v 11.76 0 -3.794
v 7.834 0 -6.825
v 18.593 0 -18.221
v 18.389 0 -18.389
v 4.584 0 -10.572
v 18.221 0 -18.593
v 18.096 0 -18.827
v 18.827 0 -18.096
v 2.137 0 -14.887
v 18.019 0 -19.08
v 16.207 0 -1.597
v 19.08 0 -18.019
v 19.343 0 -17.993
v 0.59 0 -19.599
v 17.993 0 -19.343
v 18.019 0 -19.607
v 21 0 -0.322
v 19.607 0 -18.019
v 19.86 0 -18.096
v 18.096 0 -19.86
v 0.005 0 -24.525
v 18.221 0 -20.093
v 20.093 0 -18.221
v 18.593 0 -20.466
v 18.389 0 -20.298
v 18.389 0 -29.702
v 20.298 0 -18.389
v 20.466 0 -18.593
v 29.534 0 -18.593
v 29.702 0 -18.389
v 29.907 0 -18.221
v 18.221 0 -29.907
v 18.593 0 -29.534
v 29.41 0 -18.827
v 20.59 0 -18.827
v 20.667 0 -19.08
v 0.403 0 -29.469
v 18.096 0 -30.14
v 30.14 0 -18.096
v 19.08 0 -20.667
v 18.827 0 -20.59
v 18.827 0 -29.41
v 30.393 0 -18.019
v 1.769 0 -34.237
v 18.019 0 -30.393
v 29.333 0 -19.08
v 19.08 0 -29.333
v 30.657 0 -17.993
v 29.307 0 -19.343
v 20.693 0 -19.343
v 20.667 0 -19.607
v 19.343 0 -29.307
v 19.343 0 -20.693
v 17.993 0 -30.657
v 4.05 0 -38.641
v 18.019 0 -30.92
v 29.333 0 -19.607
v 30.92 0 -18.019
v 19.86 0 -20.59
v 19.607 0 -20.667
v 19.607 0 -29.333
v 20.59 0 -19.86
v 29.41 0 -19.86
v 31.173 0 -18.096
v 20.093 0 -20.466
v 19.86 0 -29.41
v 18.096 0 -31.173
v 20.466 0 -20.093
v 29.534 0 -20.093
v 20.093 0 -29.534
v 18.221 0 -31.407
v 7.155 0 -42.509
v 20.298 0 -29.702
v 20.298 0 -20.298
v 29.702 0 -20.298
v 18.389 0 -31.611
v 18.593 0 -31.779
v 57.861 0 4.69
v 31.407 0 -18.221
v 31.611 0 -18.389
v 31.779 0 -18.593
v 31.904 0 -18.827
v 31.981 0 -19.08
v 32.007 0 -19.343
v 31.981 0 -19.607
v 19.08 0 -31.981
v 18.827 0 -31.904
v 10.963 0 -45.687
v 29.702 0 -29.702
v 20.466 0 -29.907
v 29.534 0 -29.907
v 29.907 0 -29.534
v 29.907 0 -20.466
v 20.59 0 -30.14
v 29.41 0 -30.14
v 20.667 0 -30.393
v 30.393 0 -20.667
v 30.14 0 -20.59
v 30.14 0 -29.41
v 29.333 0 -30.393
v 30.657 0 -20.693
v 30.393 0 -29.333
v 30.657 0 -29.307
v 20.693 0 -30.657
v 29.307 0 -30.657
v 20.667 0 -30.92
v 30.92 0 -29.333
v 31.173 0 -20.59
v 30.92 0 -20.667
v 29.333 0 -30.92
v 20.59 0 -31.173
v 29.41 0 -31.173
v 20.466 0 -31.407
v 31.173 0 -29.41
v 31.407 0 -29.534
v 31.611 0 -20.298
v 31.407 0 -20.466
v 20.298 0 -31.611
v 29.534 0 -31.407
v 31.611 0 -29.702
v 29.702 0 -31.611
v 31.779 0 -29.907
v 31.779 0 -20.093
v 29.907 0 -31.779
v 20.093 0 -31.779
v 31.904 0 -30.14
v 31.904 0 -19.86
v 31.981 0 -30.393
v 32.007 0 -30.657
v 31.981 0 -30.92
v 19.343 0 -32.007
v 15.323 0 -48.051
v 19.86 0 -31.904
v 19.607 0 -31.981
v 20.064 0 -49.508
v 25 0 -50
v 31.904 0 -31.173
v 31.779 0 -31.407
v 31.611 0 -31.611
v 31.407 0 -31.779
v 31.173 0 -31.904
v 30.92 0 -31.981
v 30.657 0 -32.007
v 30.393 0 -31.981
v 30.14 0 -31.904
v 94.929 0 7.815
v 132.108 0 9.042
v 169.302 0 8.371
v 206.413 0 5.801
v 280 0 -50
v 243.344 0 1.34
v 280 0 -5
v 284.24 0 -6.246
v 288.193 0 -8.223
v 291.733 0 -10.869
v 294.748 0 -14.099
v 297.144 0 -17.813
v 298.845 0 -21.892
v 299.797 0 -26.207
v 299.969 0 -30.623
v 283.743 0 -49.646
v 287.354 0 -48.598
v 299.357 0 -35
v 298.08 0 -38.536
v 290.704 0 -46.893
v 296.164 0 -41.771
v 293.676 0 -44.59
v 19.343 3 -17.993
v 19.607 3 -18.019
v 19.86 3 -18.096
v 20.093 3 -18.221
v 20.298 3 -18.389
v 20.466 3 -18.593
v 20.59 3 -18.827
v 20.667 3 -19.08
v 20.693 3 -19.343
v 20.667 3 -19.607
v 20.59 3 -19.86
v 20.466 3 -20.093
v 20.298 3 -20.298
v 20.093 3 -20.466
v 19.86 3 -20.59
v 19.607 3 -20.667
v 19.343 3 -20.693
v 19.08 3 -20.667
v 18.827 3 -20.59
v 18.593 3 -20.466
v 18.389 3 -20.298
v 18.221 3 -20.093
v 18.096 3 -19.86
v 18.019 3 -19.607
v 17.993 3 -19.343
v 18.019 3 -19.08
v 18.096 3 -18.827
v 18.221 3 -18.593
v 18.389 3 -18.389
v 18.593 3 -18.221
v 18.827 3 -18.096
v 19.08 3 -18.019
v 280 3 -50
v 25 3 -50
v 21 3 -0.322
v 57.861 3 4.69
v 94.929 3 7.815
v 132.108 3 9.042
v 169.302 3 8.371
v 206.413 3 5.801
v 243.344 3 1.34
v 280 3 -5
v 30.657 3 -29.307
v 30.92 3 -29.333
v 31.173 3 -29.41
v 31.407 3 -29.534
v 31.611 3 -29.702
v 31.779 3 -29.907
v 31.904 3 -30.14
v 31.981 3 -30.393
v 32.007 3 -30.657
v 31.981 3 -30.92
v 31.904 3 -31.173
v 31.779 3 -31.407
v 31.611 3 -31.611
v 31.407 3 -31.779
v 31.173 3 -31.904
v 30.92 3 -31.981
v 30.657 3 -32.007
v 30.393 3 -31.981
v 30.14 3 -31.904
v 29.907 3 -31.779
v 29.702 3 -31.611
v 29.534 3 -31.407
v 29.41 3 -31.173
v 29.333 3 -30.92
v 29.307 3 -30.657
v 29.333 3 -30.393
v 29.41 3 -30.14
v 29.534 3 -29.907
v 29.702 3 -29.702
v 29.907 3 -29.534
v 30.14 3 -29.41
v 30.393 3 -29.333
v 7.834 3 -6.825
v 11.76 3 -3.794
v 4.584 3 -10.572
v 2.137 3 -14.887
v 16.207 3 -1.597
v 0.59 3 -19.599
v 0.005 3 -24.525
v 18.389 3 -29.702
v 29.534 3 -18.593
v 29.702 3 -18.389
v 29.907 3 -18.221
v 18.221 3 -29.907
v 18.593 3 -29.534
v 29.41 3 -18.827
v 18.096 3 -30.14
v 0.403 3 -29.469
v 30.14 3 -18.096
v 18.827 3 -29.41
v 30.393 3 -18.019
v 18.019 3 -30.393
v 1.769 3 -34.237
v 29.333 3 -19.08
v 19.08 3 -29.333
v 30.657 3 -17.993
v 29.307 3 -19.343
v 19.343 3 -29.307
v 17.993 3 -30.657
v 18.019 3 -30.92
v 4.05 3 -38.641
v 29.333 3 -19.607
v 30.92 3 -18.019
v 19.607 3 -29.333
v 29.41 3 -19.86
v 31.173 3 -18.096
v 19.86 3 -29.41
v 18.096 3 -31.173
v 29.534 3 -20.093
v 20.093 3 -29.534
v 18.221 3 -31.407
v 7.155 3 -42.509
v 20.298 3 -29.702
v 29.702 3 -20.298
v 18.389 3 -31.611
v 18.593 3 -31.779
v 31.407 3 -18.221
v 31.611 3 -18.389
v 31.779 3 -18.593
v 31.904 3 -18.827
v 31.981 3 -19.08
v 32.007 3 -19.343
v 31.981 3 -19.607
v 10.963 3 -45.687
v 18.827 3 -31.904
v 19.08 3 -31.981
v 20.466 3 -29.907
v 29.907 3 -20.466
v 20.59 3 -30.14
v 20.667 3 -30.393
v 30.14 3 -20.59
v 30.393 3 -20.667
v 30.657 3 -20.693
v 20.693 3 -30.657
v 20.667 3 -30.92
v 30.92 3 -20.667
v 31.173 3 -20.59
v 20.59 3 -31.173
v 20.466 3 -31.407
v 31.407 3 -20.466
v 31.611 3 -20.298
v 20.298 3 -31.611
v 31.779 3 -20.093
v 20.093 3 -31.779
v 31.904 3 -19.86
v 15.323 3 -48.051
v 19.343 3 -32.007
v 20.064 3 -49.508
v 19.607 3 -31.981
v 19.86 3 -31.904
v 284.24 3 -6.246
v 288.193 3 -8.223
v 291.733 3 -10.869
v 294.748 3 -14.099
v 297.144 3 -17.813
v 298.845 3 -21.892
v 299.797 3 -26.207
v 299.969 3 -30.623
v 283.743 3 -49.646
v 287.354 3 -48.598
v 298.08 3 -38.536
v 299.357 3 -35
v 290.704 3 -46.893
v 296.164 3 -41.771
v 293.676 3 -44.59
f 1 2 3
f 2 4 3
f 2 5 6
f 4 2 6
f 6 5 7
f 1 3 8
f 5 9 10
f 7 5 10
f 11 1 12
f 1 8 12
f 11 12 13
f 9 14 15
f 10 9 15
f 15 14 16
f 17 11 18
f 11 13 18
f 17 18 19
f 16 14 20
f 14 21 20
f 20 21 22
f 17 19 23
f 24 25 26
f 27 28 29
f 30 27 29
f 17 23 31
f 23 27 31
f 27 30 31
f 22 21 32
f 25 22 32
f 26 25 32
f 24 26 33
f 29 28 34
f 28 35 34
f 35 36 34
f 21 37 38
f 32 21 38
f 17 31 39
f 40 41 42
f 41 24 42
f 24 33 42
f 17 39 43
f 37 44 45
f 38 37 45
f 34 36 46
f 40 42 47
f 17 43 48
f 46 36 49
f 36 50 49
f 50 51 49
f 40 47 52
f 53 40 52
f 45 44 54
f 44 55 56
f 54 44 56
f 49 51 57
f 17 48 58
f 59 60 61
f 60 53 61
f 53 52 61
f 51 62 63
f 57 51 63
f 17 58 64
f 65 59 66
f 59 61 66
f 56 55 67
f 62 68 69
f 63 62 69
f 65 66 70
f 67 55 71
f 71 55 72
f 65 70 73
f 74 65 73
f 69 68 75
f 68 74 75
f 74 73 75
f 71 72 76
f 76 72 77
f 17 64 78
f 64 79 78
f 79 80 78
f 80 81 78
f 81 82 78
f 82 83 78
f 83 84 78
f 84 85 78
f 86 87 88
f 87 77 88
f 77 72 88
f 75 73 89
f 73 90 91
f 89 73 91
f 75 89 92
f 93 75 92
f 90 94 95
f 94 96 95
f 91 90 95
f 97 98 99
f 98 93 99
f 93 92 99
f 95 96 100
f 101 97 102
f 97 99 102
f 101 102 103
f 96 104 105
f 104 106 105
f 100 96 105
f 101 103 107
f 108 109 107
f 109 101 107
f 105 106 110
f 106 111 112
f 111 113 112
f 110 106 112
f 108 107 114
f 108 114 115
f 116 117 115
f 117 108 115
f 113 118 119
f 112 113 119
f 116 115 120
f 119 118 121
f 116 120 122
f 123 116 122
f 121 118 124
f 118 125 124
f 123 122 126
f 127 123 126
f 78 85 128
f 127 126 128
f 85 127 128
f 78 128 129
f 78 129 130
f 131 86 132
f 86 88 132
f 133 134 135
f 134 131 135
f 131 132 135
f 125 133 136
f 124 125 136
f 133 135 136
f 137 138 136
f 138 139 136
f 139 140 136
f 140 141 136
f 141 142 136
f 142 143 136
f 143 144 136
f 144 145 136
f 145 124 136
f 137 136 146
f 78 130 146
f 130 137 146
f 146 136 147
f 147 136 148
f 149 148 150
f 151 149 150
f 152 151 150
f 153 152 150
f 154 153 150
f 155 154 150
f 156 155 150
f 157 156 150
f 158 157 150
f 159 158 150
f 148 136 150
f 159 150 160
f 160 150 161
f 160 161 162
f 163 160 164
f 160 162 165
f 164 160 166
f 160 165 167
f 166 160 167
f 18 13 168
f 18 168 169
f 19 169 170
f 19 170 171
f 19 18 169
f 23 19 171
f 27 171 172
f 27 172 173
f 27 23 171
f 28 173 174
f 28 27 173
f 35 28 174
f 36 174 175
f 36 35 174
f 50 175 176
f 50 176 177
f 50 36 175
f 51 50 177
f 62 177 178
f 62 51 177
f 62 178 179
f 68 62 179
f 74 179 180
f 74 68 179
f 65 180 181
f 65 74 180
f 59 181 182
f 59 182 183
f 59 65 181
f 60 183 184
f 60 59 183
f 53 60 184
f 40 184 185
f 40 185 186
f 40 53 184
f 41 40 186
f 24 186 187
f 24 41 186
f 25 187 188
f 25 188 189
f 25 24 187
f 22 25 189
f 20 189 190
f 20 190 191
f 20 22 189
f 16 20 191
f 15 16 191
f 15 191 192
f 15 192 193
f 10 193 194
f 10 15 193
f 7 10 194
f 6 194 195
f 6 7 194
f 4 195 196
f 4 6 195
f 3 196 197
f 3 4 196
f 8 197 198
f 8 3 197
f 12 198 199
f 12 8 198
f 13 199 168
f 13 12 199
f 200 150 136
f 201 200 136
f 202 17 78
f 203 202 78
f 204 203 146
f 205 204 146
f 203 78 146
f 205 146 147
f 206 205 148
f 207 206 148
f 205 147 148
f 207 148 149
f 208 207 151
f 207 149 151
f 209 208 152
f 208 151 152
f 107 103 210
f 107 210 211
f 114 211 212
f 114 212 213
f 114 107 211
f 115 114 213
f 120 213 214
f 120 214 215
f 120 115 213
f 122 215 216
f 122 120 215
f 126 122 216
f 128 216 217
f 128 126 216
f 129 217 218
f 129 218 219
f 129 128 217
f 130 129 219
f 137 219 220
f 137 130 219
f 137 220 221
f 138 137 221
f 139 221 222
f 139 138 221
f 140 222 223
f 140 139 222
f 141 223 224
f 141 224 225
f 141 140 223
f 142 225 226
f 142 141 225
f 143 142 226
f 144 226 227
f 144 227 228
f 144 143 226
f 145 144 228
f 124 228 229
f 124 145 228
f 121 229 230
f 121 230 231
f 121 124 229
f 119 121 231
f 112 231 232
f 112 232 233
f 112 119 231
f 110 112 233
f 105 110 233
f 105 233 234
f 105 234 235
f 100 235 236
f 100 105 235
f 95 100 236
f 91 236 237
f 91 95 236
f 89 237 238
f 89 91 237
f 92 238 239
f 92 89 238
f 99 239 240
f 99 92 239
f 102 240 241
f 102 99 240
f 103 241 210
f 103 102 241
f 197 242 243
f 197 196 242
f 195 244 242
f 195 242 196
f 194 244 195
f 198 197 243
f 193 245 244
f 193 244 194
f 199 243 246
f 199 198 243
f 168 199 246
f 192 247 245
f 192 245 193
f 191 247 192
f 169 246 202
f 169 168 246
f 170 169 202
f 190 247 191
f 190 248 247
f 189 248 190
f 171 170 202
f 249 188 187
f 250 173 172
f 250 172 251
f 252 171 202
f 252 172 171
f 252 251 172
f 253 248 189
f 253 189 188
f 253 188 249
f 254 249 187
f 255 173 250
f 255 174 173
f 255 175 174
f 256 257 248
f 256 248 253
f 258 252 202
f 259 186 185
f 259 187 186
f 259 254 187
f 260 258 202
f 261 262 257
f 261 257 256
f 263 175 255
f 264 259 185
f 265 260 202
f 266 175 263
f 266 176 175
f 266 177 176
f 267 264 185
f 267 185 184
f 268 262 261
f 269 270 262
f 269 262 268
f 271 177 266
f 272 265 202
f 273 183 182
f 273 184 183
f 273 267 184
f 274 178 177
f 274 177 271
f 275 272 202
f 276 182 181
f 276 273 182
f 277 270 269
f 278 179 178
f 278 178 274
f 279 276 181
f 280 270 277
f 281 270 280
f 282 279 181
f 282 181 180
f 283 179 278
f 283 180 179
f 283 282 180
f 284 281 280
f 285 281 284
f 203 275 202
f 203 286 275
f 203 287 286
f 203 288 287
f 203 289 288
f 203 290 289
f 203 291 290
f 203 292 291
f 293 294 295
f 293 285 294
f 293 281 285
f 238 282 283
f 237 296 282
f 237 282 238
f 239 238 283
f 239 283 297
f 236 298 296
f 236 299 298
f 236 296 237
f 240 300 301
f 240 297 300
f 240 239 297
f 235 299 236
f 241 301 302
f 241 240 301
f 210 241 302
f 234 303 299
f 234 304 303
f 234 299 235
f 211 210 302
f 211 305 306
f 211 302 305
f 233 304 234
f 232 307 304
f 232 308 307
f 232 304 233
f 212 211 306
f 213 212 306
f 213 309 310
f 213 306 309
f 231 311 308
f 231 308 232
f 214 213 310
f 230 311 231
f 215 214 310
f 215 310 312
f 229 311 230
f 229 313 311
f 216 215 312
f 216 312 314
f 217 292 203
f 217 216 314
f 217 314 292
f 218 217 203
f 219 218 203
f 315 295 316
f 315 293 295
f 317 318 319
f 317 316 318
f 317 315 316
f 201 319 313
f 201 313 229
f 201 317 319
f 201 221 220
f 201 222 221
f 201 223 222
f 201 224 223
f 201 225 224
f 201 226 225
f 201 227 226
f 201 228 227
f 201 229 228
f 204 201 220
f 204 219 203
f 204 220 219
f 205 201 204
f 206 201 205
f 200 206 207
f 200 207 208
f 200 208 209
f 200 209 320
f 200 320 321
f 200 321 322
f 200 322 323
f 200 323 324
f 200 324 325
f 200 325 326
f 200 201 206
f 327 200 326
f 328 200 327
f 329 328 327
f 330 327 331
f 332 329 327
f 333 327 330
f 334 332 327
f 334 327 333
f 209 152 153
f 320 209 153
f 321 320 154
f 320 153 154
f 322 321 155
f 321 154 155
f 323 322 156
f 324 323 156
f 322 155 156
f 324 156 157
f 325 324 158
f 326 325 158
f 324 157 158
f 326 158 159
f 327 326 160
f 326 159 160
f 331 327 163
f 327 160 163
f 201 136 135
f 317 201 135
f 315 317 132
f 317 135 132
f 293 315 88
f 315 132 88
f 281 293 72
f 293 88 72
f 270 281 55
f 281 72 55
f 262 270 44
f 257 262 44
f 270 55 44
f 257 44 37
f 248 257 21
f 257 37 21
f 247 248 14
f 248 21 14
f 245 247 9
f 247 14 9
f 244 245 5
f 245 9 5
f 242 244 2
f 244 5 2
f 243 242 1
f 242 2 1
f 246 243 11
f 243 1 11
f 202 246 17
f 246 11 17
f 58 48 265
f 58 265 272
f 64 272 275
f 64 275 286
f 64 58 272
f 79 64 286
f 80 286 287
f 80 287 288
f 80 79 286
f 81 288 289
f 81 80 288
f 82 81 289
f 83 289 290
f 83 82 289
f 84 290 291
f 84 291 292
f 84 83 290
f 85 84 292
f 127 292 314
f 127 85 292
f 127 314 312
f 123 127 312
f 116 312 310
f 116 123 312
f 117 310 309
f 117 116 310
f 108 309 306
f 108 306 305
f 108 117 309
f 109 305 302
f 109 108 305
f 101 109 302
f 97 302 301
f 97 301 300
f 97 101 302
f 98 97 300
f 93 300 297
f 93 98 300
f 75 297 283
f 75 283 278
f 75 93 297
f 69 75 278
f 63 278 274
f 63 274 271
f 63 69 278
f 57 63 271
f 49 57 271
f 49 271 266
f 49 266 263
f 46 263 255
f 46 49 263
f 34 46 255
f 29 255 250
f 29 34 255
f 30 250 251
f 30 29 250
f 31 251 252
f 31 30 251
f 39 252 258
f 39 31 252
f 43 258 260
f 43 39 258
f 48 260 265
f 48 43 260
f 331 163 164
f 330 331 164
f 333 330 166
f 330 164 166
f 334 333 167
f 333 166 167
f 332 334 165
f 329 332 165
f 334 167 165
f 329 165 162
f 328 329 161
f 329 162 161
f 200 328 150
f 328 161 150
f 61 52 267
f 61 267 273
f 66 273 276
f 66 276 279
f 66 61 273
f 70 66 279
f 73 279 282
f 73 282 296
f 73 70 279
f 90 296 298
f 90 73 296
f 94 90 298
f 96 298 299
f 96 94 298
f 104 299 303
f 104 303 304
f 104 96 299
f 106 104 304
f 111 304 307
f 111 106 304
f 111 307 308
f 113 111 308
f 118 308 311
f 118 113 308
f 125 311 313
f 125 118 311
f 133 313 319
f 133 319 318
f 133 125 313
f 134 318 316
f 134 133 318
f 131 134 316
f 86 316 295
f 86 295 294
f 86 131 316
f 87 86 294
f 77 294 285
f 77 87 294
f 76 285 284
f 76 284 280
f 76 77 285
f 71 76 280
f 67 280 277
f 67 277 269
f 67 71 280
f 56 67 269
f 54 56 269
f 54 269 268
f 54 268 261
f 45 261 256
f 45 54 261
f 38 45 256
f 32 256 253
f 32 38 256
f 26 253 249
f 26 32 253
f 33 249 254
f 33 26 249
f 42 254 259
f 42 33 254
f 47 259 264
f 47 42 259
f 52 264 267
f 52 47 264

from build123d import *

# Parameters (mm, degrees)
SKETCH1_R           = 1.35
BOSS_EXTRUDE1_DEPTH = 3


with BuildPart() as part:
    # Sketch1 → Boss-Extrude1 (new body)
    with BuildSketch(Plane(origin=(0, 0, 0), x_dir=(1, 0, 0), z_dir=(0, 1, 0))):
        with BuildLine():
            Line((280, 50), (25, 50))
            ThreePointArc((25, 50), (0.080648745, 27.00647278), (21, 0.322074641))
            ThreePointArc((21, 0.322074641), (150.709603392, -8.943952981), (280, 5))
            ThreePointArc((280, 5), (296.028917332, 15.902478251), (299.356812448, 35))
            ThreePointArc((299.356812448, 35), (292.244245466, 45.811097932), (280, 50))
        make_face()
        with Locations(Location((19.343145751, 30.656854249, 0), (0, 0, 270))):
            Circle(SKETCH1_R, mode=Mode.SUBTRACT)
        with Locations(Location((30.656854249, 30.656854249, 0), (0, 0, 270))):
            Circle(SKETCH1_R, mode=Mode.SUBTRACT)
        with Locations(Location((19.343145751, 19.343145751, 0), (0, 0, 270))):
            Circle(SKETCH1_R, mode=Mode.SUBTRACT)
        with Locations(Location((30.656854249, 19.343145751, 0), (0, 0, 270))):
            Circle(SKETCH1_R, mode=Mode.SUBTRACT)
    extrude(amount=BOSS_EXTRUDE1_DEPTH)


solid = part.part
